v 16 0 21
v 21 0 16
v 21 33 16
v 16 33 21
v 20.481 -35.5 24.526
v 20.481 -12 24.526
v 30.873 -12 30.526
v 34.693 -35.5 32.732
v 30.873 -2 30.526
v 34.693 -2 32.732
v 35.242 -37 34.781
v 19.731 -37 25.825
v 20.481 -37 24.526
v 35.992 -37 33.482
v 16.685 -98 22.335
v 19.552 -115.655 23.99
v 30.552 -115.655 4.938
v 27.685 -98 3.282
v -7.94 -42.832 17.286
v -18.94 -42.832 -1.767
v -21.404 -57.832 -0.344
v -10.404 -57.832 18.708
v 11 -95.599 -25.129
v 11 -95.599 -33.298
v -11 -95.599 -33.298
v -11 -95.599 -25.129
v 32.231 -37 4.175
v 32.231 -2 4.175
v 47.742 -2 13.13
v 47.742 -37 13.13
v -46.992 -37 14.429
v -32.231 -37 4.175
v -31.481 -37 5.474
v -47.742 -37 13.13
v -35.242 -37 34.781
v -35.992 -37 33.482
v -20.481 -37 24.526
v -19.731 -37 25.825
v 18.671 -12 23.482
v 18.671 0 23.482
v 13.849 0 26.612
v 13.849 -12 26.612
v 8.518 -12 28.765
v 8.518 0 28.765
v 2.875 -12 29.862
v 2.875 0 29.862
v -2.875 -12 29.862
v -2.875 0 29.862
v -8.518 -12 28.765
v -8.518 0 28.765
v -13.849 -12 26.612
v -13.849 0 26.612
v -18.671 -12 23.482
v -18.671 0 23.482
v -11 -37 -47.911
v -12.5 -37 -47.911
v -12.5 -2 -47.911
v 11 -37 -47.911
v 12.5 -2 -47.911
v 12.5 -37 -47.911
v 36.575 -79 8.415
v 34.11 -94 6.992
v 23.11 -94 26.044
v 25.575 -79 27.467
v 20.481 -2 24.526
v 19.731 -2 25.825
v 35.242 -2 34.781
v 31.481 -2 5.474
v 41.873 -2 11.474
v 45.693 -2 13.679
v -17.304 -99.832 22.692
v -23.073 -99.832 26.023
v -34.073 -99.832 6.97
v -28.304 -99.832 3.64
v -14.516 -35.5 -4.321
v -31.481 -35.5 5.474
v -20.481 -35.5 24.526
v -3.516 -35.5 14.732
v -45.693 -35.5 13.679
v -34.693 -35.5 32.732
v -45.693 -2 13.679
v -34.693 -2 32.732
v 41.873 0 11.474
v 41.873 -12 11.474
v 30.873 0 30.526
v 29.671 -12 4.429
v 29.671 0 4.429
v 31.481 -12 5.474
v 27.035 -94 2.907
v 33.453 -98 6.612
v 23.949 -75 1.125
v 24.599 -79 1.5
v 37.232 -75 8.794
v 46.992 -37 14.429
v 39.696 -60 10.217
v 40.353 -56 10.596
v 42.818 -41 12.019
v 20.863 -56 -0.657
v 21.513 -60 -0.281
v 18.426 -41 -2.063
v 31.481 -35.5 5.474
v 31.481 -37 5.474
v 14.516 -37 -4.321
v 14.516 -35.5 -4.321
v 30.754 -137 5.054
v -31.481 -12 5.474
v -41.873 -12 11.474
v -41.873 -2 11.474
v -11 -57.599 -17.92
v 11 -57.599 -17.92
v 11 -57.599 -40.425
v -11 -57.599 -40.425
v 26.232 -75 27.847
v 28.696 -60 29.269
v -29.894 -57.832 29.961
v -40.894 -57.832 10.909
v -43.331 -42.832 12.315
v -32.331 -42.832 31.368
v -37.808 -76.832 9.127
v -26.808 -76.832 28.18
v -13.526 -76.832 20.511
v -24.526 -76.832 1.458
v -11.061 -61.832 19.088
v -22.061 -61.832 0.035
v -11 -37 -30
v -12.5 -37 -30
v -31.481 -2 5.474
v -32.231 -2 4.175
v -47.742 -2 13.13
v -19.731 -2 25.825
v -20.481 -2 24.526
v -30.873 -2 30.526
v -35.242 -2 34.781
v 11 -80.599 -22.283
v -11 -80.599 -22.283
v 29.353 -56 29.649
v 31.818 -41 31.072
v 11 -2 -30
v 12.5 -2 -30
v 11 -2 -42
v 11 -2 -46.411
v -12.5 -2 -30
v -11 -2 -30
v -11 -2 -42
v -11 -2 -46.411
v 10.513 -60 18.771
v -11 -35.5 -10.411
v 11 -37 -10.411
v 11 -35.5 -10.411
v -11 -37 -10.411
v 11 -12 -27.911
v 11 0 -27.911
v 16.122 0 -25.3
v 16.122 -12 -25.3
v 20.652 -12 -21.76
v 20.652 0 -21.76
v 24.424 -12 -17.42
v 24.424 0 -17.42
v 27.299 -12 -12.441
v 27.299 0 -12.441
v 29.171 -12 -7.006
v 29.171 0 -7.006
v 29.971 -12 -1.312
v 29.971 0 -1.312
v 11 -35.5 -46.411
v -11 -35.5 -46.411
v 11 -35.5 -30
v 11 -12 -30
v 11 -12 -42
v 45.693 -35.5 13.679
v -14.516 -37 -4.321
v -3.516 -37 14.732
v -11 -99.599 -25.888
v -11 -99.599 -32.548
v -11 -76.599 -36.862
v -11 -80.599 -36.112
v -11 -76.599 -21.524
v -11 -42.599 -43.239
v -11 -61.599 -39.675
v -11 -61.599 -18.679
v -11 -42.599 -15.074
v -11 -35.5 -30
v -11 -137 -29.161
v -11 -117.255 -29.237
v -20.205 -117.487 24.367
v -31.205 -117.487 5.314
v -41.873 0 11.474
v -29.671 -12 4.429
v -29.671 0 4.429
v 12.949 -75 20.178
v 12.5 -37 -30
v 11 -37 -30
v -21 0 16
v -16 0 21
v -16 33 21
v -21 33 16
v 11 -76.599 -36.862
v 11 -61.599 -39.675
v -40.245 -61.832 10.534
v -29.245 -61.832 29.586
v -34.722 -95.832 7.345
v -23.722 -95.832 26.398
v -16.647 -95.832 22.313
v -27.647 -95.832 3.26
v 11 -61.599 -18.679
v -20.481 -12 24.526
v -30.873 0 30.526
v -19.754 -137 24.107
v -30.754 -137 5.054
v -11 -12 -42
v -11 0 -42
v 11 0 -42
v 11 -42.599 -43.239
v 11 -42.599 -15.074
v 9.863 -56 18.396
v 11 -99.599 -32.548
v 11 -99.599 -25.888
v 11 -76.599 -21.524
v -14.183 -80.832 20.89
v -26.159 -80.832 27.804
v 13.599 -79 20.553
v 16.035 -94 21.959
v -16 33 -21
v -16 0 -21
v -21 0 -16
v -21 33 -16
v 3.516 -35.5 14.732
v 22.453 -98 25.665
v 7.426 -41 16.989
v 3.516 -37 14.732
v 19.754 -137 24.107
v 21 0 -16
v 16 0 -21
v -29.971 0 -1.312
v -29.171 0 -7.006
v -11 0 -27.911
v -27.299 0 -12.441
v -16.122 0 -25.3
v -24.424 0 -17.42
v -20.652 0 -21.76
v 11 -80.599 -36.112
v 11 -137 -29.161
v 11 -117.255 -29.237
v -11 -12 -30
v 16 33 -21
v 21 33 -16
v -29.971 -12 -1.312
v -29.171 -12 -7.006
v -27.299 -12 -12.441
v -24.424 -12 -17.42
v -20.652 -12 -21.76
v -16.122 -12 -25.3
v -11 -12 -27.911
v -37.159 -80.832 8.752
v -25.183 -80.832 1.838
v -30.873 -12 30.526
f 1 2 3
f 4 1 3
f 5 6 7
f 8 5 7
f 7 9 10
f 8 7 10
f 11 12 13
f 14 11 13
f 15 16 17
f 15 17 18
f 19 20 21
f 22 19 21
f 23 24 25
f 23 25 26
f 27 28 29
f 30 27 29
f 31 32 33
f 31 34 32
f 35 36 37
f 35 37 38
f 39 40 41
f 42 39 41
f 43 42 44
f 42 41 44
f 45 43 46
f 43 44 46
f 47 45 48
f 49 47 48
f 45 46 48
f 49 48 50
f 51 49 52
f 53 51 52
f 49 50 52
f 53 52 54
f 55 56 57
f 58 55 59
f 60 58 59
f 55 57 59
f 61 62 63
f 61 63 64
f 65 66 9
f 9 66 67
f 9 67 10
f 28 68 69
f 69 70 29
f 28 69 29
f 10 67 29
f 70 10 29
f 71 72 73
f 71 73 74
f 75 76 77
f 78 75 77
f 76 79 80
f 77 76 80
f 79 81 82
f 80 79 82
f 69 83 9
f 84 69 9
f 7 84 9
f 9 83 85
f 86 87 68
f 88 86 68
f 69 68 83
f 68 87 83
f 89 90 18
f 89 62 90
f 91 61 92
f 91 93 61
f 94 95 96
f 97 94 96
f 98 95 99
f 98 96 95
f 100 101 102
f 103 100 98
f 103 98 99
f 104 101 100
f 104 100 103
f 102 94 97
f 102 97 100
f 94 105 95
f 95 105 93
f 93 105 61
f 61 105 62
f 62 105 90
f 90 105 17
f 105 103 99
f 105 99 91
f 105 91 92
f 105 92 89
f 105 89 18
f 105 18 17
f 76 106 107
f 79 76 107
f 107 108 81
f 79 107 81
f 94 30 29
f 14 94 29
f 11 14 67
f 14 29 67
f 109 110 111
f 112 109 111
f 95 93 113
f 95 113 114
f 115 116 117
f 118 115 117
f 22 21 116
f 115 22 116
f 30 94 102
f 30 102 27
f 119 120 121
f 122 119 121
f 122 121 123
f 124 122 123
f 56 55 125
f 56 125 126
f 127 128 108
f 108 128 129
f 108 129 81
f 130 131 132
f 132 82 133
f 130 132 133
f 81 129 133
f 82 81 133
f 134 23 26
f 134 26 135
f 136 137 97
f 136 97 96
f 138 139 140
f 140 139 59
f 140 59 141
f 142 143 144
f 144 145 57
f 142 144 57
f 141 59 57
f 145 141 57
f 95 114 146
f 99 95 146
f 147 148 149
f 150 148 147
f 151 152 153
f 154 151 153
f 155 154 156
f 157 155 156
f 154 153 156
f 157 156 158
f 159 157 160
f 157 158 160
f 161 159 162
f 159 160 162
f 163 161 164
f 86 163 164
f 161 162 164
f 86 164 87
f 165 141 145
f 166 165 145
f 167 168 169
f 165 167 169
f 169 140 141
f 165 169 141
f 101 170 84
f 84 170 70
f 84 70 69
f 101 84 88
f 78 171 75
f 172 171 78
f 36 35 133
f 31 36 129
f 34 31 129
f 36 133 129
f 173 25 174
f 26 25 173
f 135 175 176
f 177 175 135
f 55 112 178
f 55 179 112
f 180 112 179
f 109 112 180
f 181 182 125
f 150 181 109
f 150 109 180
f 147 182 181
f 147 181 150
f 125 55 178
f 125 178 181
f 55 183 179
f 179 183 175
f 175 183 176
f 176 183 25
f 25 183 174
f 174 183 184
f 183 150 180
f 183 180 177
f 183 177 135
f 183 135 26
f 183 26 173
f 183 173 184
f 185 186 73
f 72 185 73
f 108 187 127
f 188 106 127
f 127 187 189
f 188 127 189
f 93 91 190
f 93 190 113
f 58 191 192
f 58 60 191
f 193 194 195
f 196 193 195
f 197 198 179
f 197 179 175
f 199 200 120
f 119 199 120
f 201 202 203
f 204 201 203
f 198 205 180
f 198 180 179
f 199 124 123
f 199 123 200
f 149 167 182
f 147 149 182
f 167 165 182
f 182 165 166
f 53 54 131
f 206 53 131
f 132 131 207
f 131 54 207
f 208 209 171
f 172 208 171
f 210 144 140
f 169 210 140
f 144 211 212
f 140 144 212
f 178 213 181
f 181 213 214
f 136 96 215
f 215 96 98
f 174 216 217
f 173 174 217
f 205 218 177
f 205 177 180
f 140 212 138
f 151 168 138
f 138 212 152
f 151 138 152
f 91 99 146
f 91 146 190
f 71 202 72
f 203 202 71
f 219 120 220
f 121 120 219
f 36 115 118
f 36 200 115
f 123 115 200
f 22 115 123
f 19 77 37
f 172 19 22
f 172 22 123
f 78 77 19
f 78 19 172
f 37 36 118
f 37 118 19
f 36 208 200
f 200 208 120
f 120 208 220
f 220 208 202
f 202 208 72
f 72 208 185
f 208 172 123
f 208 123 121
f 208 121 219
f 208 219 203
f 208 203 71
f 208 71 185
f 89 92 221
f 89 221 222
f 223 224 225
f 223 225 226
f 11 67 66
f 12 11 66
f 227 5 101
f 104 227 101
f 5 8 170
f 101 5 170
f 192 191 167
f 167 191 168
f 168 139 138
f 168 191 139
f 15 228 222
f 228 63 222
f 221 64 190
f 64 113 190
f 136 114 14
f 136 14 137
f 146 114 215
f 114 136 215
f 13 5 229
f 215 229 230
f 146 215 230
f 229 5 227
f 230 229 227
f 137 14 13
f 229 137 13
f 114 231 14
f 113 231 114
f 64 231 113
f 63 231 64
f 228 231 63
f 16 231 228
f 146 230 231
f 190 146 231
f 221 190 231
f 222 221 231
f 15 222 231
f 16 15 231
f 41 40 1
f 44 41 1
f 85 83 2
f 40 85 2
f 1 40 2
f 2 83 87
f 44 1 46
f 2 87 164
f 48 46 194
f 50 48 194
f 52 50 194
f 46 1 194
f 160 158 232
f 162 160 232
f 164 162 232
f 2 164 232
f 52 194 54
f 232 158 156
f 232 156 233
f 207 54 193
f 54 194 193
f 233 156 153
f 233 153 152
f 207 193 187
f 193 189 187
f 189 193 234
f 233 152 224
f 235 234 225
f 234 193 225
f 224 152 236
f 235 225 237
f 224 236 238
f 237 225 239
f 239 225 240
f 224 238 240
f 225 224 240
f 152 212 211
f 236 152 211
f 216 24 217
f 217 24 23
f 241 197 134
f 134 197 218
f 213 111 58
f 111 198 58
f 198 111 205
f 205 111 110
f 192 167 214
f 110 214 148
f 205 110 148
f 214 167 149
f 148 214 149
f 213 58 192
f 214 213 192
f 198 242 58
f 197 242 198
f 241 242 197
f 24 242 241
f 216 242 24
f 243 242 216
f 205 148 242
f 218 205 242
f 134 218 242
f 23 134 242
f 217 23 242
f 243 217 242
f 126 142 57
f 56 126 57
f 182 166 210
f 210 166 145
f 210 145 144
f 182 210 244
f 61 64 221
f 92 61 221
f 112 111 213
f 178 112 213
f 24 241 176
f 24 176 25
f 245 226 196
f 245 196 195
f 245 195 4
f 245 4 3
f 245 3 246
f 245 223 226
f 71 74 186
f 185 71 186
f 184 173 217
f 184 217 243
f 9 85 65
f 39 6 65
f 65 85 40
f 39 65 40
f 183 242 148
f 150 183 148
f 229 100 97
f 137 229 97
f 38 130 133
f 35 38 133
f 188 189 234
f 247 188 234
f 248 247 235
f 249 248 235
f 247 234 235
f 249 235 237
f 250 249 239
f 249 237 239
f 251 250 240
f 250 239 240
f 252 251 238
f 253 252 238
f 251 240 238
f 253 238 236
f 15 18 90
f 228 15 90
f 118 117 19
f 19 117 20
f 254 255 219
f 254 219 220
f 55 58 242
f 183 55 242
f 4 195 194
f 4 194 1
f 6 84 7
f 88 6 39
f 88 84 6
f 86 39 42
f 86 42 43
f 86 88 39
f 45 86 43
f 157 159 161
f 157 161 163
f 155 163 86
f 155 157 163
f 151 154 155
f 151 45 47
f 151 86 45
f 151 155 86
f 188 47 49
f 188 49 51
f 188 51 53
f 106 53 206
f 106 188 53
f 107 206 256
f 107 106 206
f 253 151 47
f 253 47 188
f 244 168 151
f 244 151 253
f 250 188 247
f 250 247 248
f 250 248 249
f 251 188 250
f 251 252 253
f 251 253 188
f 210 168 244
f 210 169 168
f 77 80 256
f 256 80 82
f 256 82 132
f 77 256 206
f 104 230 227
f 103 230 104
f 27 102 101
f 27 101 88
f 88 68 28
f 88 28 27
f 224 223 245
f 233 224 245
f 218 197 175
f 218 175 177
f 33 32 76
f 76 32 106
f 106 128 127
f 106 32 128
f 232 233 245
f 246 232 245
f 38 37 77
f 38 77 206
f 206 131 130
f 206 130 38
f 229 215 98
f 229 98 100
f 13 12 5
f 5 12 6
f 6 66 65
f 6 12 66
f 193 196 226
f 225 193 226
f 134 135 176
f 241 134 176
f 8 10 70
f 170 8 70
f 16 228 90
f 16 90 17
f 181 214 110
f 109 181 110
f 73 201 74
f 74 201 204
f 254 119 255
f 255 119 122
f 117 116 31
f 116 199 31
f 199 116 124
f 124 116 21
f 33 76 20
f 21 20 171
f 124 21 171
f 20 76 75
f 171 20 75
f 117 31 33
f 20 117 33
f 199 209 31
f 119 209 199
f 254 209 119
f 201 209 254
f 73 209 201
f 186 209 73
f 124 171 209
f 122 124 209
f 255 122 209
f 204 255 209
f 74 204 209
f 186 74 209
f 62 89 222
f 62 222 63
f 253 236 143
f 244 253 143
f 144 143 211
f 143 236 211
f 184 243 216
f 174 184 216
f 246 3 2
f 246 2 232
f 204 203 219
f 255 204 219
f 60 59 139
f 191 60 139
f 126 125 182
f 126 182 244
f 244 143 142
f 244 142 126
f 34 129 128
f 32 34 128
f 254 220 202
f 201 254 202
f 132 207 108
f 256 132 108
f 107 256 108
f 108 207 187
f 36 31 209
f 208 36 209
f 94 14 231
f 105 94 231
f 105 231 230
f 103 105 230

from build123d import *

# Parameters (mm, degrees)
SKETCH_1_W               = 42
SKETCH_1_H               = 42
EXTRUDE_1_DEPTH          = 33
CHAMFER_1_SIZE           = 5
EXTRUDE_2_DEPTH          = 12
EXTRUDE_START            = -10
EXTRUDE_3_DEPTH          = 35
SKETCH_5_W               = 22
SKETCH_5_H               = 36
EXTRUDE_4_DEPTH          = 1.5
EXTRUDE_5_DEPTH          = 22
PATTERN_CIRCULAR_1_COUNT = 3
CUT_EXTRUDE_1_DEPTH      = 65.991772006
CUT_EXTRUDE_2_DEPTH      = 59.741772006
CUT_EXTRUDE_3_DEPTH      = 65.991772006


with BuildPart() as part:
    # Sketch 1 → Extrude 1 (new body)
    with BuildSketch(Plane(origin=(0, 0, 0), x_dir=(1, 0, 0), z_dir=(0, 1, 0))):
        Rectangle(SKETCH_1_W, SKETCH_1_H)
    extrude(amount=EXTRUDE_1_DEPTH)

    # Chamfer 1
    chamfer_1_edges = [part.edges().sort_by_distance(p)[0] for p in [
        (21, 16.5, 21),
        (-21, 16.5, 21),
        (-21, 16.5, -21),
        (21, 16.5, -21),
    ]]
    chamfer(chamfer_1_edges, length=CHAMFER_1_SIZE)

    # Sketch 3 → Extrude 2 (add)
    with BuildSketch(Plane(origin=(0, 0, 0), x_dir=(1, 0, 0), z_dir=(0, 1, 0))):
        with BuildLine():
            Line((-11, 27.910571474), (-11, 42))
            Line((-11, 42), (11, 42))
            Line((11, 42), (11, 27.910571474))
            ThreePointArc((11, 27.910571474), (25.980762114, 15), (29.671263931, -4.429006295))
            Line((29.671263931, -4.429006295), (41.873066959, -11.473720558))
            Line((41.873066959, -11.473720558), (30.873066959, -30.526279442))
            Line((30.873066959, -30.526279442), (18.671263931, -23.481565179))
            ThreePointArc((18.671263931, -23.481565179), (0, -30), (-18.671263931, -23.481565179))
            Line((-18.671263931, -23.481565179), (-30.873066959, -30.526279442))
            Line((-30.873066959, -30.526279442), (-41.873066959, -11.473720558))
            Line((-41.873066959, -11.473720558), (-29.671263931, -4.429006295))
            ThreePointArc((-29.671263931, -4.429006295), (-25.980762114, 15), (-11, 27.910571474))
        make_face()
    extrude(amount=-EXTRUDE_2_DEPTH)

    # Sketch 4 → Extrude 3 (add)
    with BuildSketch(Plane(origin=(0, -12, 0), x_dir=(-1, 0, 0), z_dir=(0, -1, 0)).offset(EXTRUDE_START)):
        Polygon((-11, 30), (-11, 46.410571474), (11, 46.410571474), (11, 30), (12.5, 30), (12.5, 47.910571474), (-12.5, 47.910571474), (-12.5, 30), align=None)
    extrude_3 = extrude(amount=EXTRUDE_3_DEPTH)

    # Sketch 5 → Extrude 4 (add)
    with BuildSketch(Plane(origin=(0, -37, 0), x_dir=(-1, 0, 0), z_dir=(0, -1, 0))):
        with Locations((0, 28.410571474)):
            Rectangle(SKETCH_5_W, SKETCH_5_H)
    extrude_4 = extrude(amount=-EXTRUDE_4_DEPTH)

    # Sketch 6 → Extrude 5 (add)
    with BuildSketch(Plane(origin=(11, 0, 0), x_dir=(0, 0, -1), z_dir=(1, 0, 0))):
        Polygon((10.410571474, -37), (47.910571474, -37), (29.160571474, -137), align=None)
    extrude_5 = extrude(amount=-EXTRUDE_5_DEPTH)

    # Pattern Circular 1: Extrude 3, Extrude 4, Extrude 5 ×3 about axis
    pattern_circular_1_axis = Axis((0, 0, 0), (0, 1, 0))
    for i in range(1, PATTERN_CIRCULAR_1_COUNT):
        add(extrude_3.rotate(pattern_circular_1_axis, i * 360 / PATTERN_CIRCULAR_1_COUNT))
        add(extrude_4.rotate(pattern_circular_1_axis, i * 360 / PATTERN_CIRCULAR_1_COUNT))
        add(extrude_5.rotate(pattern_circular_1_axis, i * 360 / PATTERN_CIRCULAR_1_COUNT))

    # Sketch 7 → Cut-Extrude 1 (cut, through all)
    with BuildSketch(Plane(origin=(5.5, 0, -9.526279442), x_dir=(-0.866025404, 0, -0.5), z_dir=(0.5, 0, -0.866025404))):
        Polygon((-40.245205142, -56), (-17.739434055, -56), (-14.926151928, -41), (-26.07846167, -41), (-43.090866325, -41), align=None)
        Polygon((-39.48636216, -60), (-18.489642622, -60), (-21.302924749, -75), (-36.640700976, -75), align=None)
        Polygon((-35.881857994, -79), (-22.053133316, -79), (-24.866415443, -94), (-33.036196811, -94), align=None)
        Polygon((-28.927933406, -115.655406991), (-25.61662401, -98), (-32.277353829, -98), align=None)
    extrude(amount=-CUT_EXTRUDE_1_DEPTH, mode=Mode.SUBTRACT)

    # Sketch 8 → Cut-Extrude 2 (cut, through all)
    with BuildSketch(Plane(origin=(11, 0, 0), x_dir=(0, 0, -1), z_dir=(1, 0, 0))):
        Polygon((17.91967612, -57.599451379), (40.425447207, -57.599451379), (43.238729334, -42.599451379), (32.086419592, -42.599451379), (15.074014936, -42.599451379), align=None)
        Polygon((18.678519102, -61.599451379), (39.675238639, -61.599451379), (36.861956513, -76.599451379), (21.524180285, -76.599451379), align=None)
        Polygon((22.283023267, -80.599451379), (36.111747945, -80.599451379), (33.298465818, -95.599451379), (25.12868445, -95.599451379), align=None)
        Polygon((29.236947856, -117.25485837), (32.548257251, -99.599451379), (25.887527433, -99.599451379), align=None)
    extrude(amount=-CUT_EXTRUDE_2_DEPTH, mode=Mode.SUBTRACT)

    # Sketch 9 → Cut-Extrude 3 (cut, through all)
    with BuildSketch(Plane(origin=(-5.5, 0, -9.526279442), x_dir=(-0.866025404, 0, 0.5), z_dir=(-0.5, 0, -0.866025404))):
        Polygon((18.364266378, -57.83156369), (40.870037466, -57.83156369), (43.683319592, -42.83156369), (32.531009851, -42.83156369), (15.518605195, -42.83156369), align=None)
        Polygon((19.123109361, -61.83156369), (40.119828898, -61.83156369), (37.306546771, -76.83156369), (21.968770544, -76.83156369), align=None)
        Polygon((22.727613526, -80.83156369), (36.556338204, -80.83156369), (33.743056077, -95.83156369), (25.573274709, -95.83156369), align=None)
        Polygon((29.681538115, -117.486970681), (32.99284751, -99.83156369), (26.332117691, -99.83156369), align=None)
    extrude(amount=-CUT_EXTRUDE_3_DEPTH, mode=Mode.SUBTRACT)


solid = part.part
